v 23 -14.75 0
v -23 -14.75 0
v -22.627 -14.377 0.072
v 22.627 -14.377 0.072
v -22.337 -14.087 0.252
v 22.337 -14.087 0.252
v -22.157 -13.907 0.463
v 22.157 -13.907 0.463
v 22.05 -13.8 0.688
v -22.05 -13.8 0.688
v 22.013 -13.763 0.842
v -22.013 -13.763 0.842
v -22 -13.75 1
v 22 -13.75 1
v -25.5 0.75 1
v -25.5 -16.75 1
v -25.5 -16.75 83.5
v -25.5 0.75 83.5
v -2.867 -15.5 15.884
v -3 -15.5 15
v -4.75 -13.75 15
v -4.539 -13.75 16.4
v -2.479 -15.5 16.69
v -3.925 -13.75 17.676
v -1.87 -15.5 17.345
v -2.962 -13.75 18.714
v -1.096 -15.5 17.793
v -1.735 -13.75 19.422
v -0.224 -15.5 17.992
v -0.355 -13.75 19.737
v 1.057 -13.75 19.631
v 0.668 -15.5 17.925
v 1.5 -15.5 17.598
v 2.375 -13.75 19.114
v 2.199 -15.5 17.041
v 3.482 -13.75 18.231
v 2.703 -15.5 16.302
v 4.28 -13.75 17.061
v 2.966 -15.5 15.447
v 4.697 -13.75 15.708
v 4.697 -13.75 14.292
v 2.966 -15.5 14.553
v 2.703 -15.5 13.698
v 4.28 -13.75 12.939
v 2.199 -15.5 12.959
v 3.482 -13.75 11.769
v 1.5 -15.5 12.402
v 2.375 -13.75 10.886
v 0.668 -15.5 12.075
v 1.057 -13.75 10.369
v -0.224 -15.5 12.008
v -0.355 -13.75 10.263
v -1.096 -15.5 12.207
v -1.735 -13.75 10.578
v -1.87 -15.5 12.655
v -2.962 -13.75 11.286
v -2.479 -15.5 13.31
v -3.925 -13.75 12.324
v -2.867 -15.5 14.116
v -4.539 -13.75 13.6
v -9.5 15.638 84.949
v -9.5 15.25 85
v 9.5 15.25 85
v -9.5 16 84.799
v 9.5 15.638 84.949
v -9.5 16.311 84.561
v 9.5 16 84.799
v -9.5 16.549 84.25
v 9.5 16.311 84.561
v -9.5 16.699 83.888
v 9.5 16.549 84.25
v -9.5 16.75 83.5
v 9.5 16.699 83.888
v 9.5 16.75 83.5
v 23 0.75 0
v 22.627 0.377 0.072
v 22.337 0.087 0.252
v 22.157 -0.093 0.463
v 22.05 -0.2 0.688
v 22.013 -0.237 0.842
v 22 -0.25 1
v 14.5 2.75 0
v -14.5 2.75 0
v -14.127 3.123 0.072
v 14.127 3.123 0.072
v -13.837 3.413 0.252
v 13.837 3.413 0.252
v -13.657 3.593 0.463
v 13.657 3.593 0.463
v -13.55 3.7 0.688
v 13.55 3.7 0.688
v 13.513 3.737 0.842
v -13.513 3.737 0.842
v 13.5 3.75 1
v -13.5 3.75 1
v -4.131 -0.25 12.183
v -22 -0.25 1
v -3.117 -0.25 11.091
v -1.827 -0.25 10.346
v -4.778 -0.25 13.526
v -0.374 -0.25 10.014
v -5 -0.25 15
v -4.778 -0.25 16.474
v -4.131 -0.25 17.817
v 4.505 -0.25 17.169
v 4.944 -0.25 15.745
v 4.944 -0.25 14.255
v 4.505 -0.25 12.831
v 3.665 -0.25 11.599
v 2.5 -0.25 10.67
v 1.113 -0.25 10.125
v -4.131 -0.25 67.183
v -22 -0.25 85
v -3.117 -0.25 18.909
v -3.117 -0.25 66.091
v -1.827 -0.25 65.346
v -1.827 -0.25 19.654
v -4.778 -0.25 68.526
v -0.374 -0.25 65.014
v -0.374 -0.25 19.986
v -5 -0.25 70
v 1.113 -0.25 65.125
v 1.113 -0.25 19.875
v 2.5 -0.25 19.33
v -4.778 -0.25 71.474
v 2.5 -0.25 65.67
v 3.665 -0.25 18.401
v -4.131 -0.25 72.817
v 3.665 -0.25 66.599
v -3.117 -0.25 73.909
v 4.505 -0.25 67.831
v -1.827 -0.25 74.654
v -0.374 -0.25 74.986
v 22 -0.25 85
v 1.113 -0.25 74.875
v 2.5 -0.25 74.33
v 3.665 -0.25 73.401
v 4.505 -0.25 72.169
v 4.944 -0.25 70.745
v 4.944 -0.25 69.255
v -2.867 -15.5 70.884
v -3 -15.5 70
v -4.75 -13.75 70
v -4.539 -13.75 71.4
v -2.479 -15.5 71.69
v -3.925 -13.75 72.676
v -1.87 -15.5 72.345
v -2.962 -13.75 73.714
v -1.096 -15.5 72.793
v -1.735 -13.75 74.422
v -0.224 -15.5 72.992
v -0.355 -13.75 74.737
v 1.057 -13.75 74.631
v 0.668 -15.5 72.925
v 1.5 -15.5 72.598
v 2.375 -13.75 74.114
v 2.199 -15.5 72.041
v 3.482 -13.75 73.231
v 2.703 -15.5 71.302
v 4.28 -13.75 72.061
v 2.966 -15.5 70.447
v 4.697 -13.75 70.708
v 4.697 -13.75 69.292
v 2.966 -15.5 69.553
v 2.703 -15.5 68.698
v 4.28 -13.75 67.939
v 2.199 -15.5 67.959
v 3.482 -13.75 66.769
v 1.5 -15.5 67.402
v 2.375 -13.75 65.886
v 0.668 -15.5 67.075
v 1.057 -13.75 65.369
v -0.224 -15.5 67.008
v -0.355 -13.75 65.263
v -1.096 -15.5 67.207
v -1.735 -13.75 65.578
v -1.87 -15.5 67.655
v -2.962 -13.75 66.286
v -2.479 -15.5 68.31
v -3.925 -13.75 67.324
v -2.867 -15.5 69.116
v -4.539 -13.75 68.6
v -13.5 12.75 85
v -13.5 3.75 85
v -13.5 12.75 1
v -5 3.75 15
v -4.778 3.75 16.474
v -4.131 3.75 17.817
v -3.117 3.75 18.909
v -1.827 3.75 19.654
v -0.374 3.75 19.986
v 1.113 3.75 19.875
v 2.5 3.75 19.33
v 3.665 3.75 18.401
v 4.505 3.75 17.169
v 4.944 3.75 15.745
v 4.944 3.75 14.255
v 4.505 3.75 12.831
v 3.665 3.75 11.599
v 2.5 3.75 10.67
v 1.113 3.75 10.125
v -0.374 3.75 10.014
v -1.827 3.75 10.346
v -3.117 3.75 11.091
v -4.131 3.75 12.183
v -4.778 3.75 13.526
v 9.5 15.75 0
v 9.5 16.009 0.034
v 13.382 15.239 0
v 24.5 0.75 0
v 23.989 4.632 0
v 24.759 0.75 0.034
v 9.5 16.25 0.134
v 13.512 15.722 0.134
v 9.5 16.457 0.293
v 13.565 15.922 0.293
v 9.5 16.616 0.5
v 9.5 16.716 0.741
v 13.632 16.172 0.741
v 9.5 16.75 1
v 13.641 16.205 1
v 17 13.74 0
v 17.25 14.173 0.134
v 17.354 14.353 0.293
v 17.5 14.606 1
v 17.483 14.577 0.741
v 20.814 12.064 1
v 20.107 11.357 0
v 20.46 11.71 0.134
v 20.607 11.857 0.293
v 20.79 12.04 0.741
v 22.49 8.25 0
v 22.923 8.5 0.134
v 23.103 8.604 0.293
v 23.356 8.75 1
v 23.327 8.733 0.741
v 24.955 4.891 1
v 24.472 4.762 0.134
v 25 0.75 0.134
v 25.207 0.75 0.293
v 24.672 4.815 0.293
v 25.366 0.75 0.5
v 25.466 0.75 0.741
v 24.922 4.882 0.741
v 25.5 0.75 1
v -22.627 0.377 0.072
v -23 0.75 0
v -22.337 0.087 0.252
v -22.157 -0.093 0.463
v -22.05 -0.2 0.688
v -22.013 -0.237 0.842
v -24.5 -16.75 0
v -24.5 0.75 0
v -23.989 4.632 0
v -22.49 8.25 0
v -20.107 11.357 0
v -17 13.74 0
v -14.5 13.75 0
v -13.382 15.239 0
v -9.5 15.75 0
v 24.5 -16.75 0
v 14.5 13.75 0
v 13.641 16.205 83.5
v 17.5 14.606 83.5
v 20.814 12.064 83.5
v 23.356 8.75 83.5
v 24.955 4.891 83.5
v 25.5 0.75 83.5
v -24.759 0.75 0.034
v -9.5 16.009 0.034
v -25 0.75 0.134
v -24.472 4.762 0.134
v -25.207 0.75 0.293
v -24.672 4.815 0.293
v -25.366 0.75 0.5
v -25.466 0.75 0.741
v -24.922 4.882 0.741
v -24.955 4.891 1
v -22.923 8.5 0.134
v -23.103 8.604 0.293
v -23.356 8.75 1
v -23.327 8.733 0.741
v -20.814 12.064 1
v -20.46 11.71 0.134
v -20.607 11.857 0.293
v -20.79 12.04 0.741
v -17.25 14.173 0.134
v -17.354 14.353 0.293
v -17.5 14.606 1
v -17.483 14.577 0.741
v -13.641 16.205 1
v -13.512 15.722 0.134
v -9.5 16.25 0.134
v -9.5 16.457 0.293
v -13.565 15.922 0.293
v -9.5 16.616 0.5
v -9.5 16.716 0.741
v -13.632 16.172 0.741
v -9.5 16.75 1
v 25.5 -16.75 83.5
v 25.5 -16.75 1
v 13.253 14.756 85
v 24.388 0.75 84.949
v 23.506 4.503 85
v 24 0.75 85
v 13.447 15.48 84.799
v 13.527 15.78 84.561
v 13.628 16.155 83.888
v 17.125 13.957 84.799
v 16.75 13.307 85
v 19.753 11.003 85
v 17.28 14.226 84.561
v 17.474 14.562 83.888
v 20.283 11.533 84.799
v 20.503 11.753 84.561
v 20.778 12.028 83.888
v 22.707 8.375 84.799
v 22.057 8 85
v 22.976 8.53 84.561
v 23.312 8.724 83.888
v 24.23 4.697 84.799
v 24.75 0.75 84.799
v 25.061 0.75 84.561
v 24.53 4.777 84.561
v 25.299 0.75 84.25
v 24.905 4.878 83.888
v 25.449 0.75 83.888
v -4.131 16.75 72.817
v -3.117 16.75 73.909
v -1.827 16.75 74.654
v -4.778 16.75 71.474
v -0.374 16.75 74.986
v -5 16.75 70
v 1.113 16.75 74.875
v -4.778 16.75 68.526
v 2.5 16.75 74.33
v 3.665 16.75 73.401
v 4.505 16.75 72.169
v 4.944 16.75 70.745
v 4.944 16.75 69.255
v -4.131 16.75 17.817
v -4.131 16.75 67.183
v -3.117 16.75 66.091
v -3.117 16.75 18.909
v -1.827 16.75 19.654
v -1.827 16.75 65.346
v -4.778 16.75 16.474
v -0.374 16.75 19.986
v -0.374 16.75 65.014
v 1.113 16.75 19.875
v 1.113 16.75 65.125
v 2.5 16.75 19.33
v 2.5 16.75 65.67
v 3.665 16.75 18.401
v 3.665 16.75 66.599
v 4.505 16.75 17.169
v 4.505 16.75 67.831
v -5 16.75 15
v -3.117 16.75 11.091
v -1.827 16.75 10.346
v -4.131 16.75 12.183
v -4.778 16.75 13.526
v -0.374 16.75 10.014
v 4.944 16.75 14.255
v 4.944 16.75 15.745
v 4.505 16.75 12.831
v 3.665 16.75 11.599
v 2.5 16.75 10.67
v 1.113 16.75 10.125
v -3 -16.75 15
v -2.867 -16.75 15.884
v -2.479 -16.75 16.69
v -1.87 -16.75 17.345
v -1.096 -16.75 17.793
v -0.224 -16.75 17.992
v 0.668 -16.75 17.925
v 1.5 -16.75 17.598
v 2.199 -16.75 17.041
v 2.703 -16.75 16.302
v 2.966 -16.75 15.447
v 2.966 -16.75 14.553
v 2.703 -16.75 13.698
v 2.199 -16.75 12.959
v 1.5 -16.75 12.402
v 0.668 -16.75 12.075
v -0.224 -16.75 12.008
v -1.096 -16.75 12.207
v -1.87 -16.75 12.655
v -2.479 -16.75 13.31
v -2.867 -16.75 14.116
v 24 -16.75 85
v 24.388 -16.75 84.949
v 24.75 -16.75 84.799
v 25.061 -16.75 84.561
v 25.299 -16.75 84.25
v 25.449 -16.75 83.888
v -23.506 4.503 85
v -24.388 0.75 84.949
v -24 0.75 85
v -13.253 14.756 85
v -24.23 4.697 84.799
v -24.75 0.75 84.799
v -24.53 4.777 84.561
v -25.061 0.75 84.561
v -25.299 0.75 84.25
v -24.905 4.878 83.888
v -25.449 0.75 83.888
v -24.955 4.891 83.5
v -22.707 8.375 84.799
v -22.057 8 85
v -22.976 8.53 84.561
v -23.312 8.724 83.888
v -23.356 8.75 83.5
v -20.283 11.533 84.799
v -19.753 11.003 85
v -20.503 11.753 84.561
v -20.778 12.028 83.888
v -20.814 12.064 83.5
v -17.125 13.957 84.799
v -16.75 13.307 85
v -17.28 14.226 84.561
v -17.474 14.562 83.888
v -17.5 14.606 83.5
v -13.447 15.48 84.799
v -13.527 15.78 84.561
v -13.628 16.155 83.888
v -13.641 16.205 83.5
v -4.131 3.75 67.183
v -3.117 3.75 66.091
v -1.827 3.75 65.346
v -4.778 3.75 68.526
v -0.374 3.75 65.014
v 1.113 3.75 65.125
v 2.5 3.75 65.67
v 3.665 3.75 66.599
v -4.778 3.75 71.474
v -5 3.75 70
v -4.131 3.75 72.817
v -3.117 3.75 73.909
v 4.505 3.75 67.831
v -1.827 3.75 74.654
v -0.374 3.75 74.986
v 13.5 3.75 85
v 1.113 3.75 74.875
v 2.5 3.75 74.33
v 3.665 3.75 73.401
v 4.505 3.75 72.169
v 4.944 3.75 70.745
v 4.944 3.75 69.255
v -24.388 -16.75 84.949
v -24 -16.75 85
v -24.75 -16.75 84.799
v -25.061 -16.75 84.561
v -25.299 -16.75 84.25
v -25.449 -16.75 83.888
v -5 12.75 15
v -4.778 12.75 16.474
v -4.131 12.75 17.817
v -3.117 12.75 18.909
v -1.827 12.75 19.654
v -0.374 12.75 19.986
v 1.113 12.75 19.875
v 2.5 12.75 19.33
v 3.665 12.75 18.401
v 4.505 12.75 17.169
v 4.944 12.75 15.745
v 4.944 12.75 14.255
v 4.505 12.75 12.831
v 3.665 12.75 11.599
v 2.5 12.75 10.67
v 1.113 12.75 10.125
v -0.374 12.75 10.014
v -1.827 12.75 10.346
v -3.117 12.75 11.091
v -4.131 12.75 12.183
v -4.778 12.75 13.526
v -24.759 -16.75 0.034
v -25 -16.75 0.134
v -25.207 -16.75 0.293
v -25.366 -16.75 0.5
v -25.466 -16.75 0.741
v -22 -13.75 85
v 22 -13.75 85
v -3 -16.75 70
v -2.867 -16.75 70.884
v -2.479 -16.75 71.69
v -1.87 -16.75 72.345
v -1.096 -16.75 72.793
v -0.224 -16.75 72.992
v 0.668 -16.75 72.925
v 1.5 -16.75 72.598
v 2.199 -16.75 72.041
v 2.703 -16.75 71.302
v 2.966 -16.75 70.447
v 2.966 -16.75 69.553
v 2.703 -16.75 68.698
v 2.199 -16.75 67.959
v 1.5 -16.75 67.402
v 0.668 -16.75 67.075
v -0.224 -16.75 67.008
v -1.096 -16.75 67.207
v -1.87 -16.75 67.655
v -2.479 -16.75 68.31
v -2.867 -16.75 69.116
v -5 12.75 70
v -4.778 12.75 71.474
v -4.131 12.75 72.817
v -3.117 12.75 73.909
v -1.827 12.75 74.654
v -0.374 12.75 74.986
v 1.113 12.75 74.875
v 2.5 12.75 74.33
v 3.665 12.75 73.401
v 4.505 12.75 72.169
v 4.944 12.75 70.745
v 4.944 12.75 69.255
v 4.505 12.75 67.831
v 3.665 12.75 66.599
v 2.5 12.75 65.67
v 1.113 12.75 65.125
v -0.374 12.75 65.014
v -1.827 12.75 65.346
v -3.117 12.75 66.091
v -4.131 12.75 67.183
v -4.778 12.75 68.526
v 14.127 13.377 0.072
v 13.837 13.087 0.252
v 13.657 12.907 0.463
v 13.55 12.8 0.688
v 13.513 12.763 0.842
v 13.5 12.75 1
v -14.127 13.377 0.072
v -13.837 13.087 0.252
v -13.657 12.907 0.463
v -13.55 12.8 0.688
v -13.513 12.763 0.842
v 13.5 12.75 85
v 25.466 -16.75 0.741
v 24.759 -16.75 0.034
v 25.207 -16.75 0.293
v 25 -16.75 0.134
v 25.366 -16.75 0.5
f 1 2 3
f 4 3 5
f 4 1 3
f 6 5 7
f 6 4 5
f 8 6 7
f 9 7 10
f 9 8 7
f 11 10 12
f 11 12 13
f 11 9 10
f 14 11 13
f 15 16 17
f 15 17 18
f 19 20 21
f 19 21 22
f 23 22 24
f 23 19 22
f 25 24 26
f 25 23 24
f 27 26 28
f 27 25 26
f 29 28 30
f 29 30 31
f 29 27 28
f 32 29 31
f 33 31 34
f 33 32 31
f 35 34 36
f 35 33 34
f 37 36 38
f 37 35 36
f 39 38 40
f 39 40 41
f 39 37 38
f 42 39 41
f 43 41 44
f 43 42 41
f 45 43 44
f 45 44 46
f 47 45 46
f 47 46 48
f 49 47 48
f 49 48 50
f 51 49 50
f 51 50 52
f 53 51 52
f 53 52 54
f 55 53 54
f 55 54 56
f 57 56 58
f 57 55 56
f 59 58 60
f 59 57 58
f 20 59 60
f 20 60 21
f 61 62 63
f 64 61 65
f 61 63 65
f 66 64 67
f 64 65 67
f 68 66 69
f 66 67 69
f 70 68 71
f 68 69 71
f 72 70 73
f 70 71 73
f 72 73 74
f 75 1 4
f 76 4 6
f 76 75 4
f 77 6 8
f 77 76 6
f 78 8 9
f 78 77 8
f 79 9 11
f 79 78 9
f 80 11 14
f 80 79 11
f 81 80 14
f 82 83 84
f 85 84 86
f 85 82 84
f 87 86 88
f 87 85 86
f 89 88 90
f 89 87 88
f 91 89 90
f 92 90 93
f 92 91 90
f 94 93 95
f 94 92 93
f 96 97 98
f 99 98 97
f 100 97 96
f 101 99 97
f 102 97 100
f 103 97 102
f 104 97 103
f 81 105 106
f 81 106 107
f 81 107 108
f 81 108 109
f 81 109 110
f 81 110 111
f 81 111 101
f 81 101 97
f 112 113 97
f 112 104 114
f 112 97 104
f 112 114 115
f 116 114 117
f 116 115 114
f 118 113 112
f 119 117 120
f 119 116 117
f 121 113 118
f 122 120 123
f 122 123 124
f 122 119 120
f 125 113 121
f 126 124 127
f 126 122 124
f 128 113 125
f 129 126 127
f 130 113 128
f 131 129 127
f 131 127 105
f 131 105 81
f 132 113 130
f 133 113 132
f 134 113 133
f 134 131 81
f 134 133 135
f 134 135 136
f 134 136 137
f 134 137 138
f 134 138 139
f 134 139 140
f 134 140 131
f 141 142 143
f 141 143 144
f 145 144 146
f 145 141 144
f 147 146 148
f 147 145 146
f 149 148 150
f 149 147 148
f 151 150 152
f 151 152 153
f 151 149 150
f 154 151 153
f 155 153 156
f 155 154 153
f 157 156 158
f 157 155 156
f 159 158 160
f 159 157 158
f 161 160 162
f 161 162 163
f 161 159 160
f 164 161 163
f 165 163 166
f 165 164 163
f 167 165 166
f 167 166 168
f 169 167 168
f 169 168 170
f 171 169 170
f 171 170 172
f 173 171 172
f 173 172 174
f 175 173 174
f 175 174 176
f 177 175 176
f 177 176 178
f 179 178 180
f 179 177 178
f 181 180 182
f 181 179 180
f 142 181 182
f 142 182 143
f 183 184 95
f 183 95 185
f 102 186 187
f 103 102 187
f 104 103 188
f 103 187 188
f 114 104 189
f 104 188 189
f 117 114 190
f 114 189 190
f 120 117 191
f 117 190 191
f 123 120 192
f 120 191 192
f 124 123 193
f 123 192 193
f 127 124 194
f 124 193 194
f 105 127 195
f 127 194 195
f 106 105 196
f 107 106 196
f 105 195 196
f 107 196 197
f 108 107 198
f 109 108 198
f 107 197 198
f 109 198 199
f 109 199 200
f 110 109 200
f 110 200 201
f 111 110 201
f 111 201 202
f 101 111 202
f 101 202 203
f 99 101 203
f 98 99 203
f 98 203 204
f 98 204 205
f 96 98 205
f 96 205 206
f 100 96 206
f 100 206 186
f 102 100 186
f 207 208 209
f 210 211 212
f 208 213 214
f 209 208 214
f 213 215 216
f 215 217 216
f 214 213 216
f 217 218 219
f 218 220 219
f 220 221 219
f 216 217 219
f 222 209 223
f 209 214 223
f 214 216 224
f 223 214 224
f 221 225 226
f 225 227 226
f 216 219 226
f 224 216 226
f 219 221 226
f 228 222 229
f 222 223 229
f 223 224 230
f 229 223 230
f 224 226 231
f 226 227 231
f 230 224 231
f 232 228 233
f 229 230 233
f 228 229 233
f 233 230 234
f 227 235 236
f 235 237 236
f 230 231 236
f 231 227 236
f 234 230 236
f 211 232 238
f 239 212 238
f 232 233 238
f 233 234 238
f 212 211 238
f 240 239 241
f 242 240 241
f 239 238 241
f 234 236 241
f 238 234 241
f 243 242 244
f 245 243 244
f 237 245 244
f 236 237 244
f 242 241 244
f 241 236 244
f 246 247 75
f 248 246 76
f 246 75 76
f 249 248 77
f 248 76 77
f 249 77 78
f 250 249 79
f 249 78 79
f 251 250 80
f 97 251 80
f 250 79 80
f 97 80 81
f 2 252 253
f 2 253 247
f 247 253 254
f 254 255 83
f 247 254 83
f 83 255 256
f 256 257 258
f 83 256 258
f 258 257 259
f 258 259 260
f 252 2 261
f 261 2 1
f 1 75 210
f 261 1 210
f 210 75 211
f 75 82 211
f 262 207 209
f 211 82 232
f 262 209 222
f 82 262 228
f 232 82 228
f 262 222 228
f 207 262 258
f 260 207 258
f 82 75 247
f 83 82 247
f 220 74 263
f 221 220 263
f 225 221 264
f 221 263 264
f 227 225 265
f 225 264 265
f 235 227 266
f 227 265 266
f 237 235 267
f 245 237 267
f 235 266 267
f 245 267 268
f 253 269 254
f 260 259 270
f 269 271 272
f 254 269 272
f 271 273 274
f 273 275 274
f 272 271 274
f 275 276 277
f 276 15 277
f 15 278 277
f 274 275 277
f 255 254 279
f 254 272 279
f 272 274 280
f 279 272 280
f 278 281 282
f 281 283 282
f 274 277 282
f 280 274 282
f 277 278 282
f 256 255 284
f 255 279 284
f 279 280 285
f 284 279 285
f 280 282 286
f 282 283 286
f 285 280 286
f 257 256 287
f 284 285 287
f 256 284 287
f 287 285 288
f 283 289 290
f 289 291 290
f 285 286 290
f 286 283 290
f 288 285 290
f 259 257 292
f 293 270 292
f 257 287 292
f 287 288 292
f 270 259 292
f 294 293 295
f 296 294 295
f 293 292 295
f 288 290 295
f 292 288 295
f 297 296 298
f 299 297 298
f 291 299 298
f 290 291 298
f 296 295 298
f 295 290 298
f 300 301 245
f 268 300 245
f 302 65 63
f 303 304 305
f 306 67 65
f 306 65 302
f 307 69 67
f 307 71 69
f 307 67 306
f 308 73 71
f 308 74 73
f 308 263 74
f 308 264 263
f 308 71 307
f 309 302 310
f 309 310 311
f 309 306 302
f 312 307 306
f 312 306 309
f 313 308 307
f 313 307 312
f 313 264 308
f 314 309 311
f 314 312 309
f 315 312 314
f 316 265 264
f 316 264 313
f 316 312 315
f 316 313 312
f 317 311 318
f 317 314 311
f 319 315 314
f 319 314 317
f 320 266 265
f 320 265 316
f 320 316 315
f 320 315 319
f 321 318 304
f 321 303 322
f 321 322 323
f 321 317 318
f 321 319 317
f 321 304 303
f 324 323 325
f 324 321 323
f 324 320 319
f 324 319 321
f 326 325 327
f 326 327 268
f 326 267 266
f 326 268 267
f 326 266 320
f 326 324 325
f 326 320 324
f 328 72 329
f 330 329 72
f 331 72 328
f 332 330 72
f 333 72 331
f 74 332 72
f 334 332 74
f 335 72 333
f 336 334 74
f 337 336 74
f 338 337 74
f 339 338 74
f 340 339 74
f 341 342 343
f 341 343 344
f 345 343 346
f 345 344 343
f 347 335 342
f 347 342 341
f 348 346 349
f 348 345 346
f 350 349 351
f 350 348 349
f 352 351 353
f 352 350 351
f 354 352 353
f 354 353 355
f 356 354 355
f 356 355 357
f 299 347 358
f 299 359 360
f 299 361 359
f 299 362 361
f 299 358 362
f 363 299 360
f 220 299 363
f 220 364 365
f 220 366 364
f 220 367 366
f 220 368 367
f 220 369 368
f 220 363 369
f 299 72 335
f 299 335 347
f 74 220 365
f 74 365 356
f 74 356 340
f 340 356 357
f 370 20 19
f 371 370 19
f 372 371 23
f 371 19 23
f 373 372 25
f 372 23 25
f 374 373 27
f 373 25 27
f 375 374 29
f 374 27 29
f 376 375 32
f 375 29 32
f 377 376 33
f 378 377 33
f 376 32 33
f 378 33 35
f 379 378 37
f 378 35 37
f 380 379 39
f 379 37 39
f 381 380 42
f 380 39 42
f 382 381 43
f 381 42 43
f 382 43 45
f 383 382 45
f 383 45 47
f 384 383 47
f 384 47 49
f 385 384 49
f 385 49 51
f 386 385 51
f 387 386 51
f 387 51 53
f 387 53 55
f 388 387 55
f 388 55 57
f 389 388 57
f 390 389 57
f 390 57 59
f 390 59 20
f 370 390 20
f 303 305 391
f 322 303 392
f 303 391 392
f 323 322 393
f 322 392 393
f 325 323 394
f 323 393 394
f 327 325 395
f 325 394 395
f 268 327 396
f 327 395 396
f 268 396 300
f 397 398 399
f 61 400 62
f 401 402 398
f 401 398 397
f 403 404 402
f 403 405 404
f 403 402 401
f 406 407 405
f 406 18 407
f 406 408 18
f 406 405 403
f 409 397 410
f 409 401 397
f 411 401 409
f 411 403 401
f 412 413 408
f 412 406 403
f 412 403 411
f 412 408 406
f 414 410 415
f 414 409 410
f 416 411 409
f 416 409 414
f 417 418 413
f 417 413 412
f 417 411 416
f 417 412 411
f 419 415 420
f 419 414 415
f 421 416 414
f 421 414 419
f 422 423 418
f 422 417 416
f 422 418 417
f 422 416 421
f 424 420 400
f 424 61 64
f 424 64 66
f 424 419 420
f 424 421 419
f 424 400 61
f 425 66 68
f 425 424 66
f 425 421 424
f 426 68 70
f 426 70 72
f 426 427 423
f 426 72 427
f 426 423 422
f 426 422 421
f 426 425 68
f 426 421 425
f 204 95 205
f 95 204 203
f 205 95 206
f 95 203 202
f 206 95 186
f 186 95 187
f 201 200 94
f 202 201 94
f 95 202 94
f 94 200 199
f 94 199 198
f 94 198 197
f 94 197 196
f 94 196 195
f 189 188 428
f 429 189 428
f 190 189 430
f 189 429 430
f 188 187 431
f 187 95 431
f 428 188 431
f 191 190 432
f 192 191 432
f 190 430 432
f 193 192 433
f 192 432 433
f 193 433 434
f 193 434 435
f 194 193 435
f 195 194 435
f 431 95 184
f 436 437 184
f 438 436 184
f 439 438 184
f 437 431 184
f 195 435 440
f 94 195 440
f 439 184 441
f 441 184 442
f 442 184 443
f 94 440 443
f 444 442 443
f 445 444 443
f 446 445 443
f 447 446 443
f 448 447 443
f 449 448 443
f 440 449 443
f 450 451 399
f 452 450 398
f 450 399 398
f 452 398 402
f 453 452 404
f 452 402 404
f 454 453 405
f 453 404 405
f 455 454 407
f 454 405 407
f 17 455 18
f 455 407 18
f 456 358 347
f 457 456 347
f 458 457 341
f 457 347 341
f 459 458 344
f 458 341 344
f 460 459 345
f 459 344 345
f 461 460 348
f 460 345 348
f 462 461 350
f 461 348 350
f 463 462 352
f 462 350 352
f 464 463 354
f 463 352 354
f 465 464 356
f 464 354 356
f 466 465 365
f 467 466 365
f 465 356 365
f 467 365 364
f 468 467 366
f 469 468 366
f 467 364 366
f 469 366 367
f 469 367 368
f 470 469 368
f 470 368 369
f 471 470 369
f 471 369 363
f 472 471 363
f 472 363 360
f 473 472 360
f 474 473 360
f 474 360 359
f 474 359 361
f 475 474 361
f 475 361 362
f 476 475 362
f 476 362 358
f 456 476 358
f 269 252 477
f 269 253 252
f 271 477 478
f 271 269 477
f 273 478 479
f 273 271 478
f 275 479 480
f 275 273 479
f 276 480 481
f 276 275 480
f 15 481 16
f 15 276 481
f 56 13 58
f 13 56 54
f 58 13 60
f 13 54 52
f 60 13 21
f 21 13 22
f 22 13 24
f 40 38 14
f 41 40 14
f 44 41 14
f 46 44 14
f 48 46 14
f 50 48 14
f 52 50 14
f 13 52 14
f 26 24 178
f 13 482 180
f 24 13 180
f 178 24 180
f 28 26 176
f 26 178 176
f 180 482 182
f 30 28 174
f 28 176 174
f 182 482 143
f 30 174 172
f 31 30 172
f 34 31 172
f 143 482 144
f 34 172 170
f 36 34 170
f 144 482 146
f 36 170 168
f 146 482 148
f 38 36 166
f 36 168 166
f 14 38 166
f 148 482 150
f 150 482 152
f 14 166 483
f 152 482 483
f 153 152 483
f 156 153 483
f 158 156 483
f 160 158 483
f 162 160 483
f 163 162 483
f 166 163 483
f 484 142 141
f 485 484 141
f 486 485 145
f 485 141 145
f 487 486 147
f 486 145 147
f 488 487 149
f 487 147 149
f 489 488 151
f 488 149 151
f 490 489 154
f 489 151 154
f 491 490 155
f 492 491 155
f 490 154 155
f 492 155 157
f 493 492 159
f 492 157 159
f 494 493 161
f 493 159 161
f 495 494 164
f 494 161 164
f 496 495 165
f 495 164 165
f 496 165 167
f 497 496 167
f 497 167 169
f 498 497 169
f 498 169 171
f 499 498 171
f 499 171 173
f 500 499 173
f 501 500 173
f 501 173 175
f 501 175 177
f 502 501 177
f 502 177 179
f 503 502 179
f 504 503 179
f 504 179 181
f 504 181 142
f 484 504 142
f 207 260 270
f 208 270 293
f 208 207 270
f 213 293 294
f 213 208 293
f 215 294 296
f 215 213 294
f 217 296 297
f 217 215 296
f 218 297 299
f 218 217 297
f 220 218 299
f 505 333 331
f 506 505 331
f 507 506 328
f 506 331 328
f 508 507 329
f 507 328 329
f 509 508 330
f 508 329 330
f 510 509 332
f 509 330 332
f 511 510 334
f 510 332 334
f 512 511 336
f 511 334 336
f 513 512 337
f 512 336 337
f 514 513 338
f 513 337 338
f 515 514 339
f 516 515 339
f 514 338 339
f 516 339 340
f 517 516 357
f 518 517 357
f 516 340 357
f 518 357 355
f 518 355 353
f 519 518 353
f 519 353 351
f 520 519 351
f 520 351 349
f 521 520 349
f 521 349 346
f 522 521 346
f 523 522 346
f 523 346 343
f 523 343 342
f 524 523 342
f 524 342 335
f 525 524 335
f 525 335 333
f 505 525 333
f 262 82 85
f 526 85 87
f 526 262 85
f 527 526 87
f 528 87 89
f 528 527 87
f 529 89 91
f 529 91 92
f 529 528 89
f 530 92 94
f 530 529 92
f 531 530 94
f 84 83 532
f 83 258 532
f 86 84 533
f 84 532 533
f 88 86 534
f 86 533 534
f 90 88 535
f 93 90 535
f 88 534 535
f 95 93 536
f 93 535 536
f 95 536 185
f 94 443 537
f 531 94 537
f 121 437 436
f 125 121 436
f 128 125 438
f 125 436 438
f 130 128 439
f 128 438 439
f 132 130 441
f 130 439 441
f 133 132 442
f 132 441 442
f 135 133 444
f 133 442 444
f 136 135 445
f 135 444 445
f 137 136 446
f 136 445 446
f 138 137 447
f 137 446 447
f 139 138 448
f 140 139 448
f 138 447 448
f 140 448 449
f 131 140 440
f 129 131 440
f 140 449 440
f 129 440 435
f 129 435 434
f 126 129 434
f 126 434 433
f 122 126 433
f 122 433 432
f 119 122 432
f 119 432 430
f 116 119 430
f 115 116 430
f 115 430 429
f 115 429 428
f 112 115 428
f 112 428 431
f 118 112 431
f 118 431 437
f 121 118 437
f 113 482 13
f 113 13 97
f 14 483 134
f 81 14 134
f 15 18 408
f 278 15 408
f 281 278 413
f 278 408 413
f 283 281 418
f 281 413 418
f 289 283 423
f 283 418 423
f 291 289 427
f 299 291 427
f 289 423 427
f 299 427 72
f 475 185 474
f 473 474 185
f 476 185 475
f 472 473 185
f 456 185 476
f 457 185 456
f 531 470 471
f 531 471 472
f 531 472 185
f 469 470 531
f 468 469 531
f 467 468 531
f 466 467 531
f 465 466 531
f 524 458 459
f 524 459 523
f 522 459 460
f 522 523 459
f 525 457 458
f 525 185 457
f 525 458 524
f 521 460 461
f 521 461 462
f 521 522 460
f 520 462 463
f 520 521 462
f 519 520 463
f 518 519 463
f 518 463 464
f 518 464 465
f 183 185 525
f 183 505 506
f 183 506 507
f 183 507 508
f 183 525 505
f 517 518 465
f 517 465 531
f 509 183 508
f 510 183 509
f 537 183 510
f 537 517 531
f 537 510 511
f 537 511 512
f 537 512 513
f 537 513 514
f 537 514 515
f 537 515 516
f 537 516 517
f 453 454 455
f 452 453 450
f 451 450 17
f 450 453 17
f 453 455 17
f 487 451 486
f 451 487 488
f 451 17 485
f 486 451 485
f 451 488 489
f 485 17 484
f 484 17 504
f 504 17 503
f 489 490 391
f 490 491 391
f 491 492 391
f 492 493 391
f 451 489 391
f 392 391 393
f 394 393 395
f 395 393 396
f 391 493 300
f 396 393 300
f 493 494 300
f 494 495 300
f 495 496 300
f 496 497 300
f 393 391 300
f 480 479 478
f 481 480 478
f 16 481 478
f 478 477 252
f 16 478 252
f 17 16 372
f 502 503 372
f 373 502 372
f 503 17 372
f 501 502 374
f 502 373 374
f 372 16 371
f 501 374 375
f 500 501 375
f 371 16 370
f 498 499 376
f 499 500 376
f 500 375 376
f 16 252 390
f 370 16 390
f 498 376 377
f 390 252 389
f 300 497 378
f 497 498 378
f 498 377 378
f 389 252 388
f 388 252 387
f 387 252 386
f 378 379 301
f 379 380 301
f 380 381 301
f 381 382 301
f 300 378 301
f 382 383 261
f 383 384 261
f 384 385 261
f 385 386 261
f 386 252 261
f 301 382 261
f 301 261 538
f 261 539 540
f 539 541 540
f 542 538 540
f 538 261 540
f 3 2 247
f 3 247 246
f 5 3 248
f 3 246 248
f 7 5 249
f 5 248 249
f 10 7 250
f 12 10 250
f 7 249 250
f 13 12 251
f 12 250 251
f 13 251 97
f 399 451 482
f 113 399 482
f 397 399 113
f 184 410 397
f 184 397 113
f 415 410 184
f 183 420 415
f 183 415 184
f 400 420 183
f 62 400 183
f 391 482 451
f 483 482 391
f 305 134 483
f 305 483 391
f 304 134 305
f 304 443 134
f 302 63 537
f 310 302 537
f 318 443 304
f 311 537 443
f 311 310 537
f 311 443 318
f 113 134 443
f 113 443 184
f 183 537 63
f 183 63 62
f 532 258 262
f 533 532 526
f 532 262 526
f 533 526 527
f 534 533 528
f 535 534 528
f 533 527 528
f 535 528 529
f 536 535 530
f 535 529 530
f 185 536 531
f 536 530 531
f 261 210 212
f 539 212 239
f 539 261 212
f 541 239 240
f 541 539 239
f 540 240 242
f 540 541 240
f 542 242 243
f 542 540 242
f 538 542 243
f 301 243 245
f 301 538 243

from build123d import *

# Parameters (mm, degrees)
SKETCH_W        = 51
SKETCH_H        = 33.5
PAD_DEPTH       = 85
SKETCH001_W     = 27
SKETCH001_H     = 9
SKETCH001_W_2   = 44
SKETCH001_H_2   = 13.5
POCKET_DEPTH    = 85
FILLET_R        = 16
FILLET001_R     = 1.5
SKETCH002_R     = 5
POCKET001_DEPTH = 17
SKETCH003_R     = 3
POCKET002_DEPTH = 3.001
CHAMFER_SIZE    = 1.75
FILLET002_R     = 1
FILLET003_R     = 1


with BuildPart() as part:
    # Sketch → Pad (new body)
    with BuildSketch(Plane.XY):
        Rectangle(SKETCH_W, SKETCH_H)
    extrude(amount=PAD_DEPTH)

    # Sketch001 (on Face6 of Pad) → Pocket (cut)
    with BuildSketch(Plane.XY.offset(85)):
        with Locations((0, 8.25)):
            Rectangle(SKETCH001_W, SKETCH001_H)
        with Locations((0, -7)):
            Rectangle(SKETCH001_W_2, SKETCH001_H_2)
    extrude(amount=-POCKET_DEPTH, mode=Mode.SUBTRACT)

    # Fillet
    fillet_edges = [part.edges().sort_by_distance(p)[0] for p in [
        (25.5, 16.75, 42.5),
        (-25.5, 16.75, 42.5),
    ]]
    fillet(fillet_edges, radius=FILLET_R)

    # Fillet001
    fillet001_edges = [part.edges().sort_by_distance(p)[0] for p in [
        (20.813708, 12.063708, 85),
        (25.5, -8, 85),
        (0, 16.75, 85),
        (-20.813708, 12.063708, 85),
        (-25.5, -8, 85),
    ]]
    fillet(fillet001_edges, radius=FILLET001_R)

    # Sketch002 (on Face7 of Fillet001) → Pocket001 (cut)
    with BuildSketch(Plane(origin=(0, 16.75, 0), x_dir=(-1, 0, 0), z_dir=(0, 1, 0))):
        with Locations((0, 70)):
            Circle(SKETCH002_R)
        with Locations((0, 15)):
            Circle(SKETCH002_R)
    extrude(amount=-POCKET001_DEPTH, mode=Mode.SUBTRACT)

    # Sketch003 (on Face13 of Pocket001) → Pocket002 (cut, through all)
    with BuildSketch(Plane(origin=(0, -13.75, 0), x_dir=(-1, 0, 0), z_dir=(0, 1, 0))):
        with Locations((0, 70)):
            Circle(SKETCH003_R)
        with Locations((0, 15)):
            Circle(SKETCH003_R)
    extrude(amount=-POCKET002_DEPTH, mode=Mode.SUBTRACT)

    # Chamfer
    chamfer_edges = [part.edges().sort_by_distance(p)[0] for p in [
        (3, -13.75, 15),
        (3, -13.75, 70),
    ]]
    chamfer(chamfer_edges, length=CHAMFER_SIZE)

    # Fillet002
    fillet002_edges = [part.edges().sort_by_distance(p)[0] for p in [
        (20.813708, 12.063708, 0),
        (-20.813708, 12.063708, 0),
    ]]
    fillet(fillet002_edges, radius=FILLET002_R)

    # Fillet003
    fillet003_edges = [part.edges().sort_by_distance(p)[0] for p in [
        (0, 3.75, 0),
        (-13.5, 8.25, 0),
        (0, 12.75, 0),
        (13.5, 8.25, 0),
        (0, -0.25, 0),
        (22, -7, 0),
        (0, -13.75, 0),
        (-22, -7, 0),
    ]]
    fillet(fillet003_edges, radius=FILLET003_R)


solid = part.part
